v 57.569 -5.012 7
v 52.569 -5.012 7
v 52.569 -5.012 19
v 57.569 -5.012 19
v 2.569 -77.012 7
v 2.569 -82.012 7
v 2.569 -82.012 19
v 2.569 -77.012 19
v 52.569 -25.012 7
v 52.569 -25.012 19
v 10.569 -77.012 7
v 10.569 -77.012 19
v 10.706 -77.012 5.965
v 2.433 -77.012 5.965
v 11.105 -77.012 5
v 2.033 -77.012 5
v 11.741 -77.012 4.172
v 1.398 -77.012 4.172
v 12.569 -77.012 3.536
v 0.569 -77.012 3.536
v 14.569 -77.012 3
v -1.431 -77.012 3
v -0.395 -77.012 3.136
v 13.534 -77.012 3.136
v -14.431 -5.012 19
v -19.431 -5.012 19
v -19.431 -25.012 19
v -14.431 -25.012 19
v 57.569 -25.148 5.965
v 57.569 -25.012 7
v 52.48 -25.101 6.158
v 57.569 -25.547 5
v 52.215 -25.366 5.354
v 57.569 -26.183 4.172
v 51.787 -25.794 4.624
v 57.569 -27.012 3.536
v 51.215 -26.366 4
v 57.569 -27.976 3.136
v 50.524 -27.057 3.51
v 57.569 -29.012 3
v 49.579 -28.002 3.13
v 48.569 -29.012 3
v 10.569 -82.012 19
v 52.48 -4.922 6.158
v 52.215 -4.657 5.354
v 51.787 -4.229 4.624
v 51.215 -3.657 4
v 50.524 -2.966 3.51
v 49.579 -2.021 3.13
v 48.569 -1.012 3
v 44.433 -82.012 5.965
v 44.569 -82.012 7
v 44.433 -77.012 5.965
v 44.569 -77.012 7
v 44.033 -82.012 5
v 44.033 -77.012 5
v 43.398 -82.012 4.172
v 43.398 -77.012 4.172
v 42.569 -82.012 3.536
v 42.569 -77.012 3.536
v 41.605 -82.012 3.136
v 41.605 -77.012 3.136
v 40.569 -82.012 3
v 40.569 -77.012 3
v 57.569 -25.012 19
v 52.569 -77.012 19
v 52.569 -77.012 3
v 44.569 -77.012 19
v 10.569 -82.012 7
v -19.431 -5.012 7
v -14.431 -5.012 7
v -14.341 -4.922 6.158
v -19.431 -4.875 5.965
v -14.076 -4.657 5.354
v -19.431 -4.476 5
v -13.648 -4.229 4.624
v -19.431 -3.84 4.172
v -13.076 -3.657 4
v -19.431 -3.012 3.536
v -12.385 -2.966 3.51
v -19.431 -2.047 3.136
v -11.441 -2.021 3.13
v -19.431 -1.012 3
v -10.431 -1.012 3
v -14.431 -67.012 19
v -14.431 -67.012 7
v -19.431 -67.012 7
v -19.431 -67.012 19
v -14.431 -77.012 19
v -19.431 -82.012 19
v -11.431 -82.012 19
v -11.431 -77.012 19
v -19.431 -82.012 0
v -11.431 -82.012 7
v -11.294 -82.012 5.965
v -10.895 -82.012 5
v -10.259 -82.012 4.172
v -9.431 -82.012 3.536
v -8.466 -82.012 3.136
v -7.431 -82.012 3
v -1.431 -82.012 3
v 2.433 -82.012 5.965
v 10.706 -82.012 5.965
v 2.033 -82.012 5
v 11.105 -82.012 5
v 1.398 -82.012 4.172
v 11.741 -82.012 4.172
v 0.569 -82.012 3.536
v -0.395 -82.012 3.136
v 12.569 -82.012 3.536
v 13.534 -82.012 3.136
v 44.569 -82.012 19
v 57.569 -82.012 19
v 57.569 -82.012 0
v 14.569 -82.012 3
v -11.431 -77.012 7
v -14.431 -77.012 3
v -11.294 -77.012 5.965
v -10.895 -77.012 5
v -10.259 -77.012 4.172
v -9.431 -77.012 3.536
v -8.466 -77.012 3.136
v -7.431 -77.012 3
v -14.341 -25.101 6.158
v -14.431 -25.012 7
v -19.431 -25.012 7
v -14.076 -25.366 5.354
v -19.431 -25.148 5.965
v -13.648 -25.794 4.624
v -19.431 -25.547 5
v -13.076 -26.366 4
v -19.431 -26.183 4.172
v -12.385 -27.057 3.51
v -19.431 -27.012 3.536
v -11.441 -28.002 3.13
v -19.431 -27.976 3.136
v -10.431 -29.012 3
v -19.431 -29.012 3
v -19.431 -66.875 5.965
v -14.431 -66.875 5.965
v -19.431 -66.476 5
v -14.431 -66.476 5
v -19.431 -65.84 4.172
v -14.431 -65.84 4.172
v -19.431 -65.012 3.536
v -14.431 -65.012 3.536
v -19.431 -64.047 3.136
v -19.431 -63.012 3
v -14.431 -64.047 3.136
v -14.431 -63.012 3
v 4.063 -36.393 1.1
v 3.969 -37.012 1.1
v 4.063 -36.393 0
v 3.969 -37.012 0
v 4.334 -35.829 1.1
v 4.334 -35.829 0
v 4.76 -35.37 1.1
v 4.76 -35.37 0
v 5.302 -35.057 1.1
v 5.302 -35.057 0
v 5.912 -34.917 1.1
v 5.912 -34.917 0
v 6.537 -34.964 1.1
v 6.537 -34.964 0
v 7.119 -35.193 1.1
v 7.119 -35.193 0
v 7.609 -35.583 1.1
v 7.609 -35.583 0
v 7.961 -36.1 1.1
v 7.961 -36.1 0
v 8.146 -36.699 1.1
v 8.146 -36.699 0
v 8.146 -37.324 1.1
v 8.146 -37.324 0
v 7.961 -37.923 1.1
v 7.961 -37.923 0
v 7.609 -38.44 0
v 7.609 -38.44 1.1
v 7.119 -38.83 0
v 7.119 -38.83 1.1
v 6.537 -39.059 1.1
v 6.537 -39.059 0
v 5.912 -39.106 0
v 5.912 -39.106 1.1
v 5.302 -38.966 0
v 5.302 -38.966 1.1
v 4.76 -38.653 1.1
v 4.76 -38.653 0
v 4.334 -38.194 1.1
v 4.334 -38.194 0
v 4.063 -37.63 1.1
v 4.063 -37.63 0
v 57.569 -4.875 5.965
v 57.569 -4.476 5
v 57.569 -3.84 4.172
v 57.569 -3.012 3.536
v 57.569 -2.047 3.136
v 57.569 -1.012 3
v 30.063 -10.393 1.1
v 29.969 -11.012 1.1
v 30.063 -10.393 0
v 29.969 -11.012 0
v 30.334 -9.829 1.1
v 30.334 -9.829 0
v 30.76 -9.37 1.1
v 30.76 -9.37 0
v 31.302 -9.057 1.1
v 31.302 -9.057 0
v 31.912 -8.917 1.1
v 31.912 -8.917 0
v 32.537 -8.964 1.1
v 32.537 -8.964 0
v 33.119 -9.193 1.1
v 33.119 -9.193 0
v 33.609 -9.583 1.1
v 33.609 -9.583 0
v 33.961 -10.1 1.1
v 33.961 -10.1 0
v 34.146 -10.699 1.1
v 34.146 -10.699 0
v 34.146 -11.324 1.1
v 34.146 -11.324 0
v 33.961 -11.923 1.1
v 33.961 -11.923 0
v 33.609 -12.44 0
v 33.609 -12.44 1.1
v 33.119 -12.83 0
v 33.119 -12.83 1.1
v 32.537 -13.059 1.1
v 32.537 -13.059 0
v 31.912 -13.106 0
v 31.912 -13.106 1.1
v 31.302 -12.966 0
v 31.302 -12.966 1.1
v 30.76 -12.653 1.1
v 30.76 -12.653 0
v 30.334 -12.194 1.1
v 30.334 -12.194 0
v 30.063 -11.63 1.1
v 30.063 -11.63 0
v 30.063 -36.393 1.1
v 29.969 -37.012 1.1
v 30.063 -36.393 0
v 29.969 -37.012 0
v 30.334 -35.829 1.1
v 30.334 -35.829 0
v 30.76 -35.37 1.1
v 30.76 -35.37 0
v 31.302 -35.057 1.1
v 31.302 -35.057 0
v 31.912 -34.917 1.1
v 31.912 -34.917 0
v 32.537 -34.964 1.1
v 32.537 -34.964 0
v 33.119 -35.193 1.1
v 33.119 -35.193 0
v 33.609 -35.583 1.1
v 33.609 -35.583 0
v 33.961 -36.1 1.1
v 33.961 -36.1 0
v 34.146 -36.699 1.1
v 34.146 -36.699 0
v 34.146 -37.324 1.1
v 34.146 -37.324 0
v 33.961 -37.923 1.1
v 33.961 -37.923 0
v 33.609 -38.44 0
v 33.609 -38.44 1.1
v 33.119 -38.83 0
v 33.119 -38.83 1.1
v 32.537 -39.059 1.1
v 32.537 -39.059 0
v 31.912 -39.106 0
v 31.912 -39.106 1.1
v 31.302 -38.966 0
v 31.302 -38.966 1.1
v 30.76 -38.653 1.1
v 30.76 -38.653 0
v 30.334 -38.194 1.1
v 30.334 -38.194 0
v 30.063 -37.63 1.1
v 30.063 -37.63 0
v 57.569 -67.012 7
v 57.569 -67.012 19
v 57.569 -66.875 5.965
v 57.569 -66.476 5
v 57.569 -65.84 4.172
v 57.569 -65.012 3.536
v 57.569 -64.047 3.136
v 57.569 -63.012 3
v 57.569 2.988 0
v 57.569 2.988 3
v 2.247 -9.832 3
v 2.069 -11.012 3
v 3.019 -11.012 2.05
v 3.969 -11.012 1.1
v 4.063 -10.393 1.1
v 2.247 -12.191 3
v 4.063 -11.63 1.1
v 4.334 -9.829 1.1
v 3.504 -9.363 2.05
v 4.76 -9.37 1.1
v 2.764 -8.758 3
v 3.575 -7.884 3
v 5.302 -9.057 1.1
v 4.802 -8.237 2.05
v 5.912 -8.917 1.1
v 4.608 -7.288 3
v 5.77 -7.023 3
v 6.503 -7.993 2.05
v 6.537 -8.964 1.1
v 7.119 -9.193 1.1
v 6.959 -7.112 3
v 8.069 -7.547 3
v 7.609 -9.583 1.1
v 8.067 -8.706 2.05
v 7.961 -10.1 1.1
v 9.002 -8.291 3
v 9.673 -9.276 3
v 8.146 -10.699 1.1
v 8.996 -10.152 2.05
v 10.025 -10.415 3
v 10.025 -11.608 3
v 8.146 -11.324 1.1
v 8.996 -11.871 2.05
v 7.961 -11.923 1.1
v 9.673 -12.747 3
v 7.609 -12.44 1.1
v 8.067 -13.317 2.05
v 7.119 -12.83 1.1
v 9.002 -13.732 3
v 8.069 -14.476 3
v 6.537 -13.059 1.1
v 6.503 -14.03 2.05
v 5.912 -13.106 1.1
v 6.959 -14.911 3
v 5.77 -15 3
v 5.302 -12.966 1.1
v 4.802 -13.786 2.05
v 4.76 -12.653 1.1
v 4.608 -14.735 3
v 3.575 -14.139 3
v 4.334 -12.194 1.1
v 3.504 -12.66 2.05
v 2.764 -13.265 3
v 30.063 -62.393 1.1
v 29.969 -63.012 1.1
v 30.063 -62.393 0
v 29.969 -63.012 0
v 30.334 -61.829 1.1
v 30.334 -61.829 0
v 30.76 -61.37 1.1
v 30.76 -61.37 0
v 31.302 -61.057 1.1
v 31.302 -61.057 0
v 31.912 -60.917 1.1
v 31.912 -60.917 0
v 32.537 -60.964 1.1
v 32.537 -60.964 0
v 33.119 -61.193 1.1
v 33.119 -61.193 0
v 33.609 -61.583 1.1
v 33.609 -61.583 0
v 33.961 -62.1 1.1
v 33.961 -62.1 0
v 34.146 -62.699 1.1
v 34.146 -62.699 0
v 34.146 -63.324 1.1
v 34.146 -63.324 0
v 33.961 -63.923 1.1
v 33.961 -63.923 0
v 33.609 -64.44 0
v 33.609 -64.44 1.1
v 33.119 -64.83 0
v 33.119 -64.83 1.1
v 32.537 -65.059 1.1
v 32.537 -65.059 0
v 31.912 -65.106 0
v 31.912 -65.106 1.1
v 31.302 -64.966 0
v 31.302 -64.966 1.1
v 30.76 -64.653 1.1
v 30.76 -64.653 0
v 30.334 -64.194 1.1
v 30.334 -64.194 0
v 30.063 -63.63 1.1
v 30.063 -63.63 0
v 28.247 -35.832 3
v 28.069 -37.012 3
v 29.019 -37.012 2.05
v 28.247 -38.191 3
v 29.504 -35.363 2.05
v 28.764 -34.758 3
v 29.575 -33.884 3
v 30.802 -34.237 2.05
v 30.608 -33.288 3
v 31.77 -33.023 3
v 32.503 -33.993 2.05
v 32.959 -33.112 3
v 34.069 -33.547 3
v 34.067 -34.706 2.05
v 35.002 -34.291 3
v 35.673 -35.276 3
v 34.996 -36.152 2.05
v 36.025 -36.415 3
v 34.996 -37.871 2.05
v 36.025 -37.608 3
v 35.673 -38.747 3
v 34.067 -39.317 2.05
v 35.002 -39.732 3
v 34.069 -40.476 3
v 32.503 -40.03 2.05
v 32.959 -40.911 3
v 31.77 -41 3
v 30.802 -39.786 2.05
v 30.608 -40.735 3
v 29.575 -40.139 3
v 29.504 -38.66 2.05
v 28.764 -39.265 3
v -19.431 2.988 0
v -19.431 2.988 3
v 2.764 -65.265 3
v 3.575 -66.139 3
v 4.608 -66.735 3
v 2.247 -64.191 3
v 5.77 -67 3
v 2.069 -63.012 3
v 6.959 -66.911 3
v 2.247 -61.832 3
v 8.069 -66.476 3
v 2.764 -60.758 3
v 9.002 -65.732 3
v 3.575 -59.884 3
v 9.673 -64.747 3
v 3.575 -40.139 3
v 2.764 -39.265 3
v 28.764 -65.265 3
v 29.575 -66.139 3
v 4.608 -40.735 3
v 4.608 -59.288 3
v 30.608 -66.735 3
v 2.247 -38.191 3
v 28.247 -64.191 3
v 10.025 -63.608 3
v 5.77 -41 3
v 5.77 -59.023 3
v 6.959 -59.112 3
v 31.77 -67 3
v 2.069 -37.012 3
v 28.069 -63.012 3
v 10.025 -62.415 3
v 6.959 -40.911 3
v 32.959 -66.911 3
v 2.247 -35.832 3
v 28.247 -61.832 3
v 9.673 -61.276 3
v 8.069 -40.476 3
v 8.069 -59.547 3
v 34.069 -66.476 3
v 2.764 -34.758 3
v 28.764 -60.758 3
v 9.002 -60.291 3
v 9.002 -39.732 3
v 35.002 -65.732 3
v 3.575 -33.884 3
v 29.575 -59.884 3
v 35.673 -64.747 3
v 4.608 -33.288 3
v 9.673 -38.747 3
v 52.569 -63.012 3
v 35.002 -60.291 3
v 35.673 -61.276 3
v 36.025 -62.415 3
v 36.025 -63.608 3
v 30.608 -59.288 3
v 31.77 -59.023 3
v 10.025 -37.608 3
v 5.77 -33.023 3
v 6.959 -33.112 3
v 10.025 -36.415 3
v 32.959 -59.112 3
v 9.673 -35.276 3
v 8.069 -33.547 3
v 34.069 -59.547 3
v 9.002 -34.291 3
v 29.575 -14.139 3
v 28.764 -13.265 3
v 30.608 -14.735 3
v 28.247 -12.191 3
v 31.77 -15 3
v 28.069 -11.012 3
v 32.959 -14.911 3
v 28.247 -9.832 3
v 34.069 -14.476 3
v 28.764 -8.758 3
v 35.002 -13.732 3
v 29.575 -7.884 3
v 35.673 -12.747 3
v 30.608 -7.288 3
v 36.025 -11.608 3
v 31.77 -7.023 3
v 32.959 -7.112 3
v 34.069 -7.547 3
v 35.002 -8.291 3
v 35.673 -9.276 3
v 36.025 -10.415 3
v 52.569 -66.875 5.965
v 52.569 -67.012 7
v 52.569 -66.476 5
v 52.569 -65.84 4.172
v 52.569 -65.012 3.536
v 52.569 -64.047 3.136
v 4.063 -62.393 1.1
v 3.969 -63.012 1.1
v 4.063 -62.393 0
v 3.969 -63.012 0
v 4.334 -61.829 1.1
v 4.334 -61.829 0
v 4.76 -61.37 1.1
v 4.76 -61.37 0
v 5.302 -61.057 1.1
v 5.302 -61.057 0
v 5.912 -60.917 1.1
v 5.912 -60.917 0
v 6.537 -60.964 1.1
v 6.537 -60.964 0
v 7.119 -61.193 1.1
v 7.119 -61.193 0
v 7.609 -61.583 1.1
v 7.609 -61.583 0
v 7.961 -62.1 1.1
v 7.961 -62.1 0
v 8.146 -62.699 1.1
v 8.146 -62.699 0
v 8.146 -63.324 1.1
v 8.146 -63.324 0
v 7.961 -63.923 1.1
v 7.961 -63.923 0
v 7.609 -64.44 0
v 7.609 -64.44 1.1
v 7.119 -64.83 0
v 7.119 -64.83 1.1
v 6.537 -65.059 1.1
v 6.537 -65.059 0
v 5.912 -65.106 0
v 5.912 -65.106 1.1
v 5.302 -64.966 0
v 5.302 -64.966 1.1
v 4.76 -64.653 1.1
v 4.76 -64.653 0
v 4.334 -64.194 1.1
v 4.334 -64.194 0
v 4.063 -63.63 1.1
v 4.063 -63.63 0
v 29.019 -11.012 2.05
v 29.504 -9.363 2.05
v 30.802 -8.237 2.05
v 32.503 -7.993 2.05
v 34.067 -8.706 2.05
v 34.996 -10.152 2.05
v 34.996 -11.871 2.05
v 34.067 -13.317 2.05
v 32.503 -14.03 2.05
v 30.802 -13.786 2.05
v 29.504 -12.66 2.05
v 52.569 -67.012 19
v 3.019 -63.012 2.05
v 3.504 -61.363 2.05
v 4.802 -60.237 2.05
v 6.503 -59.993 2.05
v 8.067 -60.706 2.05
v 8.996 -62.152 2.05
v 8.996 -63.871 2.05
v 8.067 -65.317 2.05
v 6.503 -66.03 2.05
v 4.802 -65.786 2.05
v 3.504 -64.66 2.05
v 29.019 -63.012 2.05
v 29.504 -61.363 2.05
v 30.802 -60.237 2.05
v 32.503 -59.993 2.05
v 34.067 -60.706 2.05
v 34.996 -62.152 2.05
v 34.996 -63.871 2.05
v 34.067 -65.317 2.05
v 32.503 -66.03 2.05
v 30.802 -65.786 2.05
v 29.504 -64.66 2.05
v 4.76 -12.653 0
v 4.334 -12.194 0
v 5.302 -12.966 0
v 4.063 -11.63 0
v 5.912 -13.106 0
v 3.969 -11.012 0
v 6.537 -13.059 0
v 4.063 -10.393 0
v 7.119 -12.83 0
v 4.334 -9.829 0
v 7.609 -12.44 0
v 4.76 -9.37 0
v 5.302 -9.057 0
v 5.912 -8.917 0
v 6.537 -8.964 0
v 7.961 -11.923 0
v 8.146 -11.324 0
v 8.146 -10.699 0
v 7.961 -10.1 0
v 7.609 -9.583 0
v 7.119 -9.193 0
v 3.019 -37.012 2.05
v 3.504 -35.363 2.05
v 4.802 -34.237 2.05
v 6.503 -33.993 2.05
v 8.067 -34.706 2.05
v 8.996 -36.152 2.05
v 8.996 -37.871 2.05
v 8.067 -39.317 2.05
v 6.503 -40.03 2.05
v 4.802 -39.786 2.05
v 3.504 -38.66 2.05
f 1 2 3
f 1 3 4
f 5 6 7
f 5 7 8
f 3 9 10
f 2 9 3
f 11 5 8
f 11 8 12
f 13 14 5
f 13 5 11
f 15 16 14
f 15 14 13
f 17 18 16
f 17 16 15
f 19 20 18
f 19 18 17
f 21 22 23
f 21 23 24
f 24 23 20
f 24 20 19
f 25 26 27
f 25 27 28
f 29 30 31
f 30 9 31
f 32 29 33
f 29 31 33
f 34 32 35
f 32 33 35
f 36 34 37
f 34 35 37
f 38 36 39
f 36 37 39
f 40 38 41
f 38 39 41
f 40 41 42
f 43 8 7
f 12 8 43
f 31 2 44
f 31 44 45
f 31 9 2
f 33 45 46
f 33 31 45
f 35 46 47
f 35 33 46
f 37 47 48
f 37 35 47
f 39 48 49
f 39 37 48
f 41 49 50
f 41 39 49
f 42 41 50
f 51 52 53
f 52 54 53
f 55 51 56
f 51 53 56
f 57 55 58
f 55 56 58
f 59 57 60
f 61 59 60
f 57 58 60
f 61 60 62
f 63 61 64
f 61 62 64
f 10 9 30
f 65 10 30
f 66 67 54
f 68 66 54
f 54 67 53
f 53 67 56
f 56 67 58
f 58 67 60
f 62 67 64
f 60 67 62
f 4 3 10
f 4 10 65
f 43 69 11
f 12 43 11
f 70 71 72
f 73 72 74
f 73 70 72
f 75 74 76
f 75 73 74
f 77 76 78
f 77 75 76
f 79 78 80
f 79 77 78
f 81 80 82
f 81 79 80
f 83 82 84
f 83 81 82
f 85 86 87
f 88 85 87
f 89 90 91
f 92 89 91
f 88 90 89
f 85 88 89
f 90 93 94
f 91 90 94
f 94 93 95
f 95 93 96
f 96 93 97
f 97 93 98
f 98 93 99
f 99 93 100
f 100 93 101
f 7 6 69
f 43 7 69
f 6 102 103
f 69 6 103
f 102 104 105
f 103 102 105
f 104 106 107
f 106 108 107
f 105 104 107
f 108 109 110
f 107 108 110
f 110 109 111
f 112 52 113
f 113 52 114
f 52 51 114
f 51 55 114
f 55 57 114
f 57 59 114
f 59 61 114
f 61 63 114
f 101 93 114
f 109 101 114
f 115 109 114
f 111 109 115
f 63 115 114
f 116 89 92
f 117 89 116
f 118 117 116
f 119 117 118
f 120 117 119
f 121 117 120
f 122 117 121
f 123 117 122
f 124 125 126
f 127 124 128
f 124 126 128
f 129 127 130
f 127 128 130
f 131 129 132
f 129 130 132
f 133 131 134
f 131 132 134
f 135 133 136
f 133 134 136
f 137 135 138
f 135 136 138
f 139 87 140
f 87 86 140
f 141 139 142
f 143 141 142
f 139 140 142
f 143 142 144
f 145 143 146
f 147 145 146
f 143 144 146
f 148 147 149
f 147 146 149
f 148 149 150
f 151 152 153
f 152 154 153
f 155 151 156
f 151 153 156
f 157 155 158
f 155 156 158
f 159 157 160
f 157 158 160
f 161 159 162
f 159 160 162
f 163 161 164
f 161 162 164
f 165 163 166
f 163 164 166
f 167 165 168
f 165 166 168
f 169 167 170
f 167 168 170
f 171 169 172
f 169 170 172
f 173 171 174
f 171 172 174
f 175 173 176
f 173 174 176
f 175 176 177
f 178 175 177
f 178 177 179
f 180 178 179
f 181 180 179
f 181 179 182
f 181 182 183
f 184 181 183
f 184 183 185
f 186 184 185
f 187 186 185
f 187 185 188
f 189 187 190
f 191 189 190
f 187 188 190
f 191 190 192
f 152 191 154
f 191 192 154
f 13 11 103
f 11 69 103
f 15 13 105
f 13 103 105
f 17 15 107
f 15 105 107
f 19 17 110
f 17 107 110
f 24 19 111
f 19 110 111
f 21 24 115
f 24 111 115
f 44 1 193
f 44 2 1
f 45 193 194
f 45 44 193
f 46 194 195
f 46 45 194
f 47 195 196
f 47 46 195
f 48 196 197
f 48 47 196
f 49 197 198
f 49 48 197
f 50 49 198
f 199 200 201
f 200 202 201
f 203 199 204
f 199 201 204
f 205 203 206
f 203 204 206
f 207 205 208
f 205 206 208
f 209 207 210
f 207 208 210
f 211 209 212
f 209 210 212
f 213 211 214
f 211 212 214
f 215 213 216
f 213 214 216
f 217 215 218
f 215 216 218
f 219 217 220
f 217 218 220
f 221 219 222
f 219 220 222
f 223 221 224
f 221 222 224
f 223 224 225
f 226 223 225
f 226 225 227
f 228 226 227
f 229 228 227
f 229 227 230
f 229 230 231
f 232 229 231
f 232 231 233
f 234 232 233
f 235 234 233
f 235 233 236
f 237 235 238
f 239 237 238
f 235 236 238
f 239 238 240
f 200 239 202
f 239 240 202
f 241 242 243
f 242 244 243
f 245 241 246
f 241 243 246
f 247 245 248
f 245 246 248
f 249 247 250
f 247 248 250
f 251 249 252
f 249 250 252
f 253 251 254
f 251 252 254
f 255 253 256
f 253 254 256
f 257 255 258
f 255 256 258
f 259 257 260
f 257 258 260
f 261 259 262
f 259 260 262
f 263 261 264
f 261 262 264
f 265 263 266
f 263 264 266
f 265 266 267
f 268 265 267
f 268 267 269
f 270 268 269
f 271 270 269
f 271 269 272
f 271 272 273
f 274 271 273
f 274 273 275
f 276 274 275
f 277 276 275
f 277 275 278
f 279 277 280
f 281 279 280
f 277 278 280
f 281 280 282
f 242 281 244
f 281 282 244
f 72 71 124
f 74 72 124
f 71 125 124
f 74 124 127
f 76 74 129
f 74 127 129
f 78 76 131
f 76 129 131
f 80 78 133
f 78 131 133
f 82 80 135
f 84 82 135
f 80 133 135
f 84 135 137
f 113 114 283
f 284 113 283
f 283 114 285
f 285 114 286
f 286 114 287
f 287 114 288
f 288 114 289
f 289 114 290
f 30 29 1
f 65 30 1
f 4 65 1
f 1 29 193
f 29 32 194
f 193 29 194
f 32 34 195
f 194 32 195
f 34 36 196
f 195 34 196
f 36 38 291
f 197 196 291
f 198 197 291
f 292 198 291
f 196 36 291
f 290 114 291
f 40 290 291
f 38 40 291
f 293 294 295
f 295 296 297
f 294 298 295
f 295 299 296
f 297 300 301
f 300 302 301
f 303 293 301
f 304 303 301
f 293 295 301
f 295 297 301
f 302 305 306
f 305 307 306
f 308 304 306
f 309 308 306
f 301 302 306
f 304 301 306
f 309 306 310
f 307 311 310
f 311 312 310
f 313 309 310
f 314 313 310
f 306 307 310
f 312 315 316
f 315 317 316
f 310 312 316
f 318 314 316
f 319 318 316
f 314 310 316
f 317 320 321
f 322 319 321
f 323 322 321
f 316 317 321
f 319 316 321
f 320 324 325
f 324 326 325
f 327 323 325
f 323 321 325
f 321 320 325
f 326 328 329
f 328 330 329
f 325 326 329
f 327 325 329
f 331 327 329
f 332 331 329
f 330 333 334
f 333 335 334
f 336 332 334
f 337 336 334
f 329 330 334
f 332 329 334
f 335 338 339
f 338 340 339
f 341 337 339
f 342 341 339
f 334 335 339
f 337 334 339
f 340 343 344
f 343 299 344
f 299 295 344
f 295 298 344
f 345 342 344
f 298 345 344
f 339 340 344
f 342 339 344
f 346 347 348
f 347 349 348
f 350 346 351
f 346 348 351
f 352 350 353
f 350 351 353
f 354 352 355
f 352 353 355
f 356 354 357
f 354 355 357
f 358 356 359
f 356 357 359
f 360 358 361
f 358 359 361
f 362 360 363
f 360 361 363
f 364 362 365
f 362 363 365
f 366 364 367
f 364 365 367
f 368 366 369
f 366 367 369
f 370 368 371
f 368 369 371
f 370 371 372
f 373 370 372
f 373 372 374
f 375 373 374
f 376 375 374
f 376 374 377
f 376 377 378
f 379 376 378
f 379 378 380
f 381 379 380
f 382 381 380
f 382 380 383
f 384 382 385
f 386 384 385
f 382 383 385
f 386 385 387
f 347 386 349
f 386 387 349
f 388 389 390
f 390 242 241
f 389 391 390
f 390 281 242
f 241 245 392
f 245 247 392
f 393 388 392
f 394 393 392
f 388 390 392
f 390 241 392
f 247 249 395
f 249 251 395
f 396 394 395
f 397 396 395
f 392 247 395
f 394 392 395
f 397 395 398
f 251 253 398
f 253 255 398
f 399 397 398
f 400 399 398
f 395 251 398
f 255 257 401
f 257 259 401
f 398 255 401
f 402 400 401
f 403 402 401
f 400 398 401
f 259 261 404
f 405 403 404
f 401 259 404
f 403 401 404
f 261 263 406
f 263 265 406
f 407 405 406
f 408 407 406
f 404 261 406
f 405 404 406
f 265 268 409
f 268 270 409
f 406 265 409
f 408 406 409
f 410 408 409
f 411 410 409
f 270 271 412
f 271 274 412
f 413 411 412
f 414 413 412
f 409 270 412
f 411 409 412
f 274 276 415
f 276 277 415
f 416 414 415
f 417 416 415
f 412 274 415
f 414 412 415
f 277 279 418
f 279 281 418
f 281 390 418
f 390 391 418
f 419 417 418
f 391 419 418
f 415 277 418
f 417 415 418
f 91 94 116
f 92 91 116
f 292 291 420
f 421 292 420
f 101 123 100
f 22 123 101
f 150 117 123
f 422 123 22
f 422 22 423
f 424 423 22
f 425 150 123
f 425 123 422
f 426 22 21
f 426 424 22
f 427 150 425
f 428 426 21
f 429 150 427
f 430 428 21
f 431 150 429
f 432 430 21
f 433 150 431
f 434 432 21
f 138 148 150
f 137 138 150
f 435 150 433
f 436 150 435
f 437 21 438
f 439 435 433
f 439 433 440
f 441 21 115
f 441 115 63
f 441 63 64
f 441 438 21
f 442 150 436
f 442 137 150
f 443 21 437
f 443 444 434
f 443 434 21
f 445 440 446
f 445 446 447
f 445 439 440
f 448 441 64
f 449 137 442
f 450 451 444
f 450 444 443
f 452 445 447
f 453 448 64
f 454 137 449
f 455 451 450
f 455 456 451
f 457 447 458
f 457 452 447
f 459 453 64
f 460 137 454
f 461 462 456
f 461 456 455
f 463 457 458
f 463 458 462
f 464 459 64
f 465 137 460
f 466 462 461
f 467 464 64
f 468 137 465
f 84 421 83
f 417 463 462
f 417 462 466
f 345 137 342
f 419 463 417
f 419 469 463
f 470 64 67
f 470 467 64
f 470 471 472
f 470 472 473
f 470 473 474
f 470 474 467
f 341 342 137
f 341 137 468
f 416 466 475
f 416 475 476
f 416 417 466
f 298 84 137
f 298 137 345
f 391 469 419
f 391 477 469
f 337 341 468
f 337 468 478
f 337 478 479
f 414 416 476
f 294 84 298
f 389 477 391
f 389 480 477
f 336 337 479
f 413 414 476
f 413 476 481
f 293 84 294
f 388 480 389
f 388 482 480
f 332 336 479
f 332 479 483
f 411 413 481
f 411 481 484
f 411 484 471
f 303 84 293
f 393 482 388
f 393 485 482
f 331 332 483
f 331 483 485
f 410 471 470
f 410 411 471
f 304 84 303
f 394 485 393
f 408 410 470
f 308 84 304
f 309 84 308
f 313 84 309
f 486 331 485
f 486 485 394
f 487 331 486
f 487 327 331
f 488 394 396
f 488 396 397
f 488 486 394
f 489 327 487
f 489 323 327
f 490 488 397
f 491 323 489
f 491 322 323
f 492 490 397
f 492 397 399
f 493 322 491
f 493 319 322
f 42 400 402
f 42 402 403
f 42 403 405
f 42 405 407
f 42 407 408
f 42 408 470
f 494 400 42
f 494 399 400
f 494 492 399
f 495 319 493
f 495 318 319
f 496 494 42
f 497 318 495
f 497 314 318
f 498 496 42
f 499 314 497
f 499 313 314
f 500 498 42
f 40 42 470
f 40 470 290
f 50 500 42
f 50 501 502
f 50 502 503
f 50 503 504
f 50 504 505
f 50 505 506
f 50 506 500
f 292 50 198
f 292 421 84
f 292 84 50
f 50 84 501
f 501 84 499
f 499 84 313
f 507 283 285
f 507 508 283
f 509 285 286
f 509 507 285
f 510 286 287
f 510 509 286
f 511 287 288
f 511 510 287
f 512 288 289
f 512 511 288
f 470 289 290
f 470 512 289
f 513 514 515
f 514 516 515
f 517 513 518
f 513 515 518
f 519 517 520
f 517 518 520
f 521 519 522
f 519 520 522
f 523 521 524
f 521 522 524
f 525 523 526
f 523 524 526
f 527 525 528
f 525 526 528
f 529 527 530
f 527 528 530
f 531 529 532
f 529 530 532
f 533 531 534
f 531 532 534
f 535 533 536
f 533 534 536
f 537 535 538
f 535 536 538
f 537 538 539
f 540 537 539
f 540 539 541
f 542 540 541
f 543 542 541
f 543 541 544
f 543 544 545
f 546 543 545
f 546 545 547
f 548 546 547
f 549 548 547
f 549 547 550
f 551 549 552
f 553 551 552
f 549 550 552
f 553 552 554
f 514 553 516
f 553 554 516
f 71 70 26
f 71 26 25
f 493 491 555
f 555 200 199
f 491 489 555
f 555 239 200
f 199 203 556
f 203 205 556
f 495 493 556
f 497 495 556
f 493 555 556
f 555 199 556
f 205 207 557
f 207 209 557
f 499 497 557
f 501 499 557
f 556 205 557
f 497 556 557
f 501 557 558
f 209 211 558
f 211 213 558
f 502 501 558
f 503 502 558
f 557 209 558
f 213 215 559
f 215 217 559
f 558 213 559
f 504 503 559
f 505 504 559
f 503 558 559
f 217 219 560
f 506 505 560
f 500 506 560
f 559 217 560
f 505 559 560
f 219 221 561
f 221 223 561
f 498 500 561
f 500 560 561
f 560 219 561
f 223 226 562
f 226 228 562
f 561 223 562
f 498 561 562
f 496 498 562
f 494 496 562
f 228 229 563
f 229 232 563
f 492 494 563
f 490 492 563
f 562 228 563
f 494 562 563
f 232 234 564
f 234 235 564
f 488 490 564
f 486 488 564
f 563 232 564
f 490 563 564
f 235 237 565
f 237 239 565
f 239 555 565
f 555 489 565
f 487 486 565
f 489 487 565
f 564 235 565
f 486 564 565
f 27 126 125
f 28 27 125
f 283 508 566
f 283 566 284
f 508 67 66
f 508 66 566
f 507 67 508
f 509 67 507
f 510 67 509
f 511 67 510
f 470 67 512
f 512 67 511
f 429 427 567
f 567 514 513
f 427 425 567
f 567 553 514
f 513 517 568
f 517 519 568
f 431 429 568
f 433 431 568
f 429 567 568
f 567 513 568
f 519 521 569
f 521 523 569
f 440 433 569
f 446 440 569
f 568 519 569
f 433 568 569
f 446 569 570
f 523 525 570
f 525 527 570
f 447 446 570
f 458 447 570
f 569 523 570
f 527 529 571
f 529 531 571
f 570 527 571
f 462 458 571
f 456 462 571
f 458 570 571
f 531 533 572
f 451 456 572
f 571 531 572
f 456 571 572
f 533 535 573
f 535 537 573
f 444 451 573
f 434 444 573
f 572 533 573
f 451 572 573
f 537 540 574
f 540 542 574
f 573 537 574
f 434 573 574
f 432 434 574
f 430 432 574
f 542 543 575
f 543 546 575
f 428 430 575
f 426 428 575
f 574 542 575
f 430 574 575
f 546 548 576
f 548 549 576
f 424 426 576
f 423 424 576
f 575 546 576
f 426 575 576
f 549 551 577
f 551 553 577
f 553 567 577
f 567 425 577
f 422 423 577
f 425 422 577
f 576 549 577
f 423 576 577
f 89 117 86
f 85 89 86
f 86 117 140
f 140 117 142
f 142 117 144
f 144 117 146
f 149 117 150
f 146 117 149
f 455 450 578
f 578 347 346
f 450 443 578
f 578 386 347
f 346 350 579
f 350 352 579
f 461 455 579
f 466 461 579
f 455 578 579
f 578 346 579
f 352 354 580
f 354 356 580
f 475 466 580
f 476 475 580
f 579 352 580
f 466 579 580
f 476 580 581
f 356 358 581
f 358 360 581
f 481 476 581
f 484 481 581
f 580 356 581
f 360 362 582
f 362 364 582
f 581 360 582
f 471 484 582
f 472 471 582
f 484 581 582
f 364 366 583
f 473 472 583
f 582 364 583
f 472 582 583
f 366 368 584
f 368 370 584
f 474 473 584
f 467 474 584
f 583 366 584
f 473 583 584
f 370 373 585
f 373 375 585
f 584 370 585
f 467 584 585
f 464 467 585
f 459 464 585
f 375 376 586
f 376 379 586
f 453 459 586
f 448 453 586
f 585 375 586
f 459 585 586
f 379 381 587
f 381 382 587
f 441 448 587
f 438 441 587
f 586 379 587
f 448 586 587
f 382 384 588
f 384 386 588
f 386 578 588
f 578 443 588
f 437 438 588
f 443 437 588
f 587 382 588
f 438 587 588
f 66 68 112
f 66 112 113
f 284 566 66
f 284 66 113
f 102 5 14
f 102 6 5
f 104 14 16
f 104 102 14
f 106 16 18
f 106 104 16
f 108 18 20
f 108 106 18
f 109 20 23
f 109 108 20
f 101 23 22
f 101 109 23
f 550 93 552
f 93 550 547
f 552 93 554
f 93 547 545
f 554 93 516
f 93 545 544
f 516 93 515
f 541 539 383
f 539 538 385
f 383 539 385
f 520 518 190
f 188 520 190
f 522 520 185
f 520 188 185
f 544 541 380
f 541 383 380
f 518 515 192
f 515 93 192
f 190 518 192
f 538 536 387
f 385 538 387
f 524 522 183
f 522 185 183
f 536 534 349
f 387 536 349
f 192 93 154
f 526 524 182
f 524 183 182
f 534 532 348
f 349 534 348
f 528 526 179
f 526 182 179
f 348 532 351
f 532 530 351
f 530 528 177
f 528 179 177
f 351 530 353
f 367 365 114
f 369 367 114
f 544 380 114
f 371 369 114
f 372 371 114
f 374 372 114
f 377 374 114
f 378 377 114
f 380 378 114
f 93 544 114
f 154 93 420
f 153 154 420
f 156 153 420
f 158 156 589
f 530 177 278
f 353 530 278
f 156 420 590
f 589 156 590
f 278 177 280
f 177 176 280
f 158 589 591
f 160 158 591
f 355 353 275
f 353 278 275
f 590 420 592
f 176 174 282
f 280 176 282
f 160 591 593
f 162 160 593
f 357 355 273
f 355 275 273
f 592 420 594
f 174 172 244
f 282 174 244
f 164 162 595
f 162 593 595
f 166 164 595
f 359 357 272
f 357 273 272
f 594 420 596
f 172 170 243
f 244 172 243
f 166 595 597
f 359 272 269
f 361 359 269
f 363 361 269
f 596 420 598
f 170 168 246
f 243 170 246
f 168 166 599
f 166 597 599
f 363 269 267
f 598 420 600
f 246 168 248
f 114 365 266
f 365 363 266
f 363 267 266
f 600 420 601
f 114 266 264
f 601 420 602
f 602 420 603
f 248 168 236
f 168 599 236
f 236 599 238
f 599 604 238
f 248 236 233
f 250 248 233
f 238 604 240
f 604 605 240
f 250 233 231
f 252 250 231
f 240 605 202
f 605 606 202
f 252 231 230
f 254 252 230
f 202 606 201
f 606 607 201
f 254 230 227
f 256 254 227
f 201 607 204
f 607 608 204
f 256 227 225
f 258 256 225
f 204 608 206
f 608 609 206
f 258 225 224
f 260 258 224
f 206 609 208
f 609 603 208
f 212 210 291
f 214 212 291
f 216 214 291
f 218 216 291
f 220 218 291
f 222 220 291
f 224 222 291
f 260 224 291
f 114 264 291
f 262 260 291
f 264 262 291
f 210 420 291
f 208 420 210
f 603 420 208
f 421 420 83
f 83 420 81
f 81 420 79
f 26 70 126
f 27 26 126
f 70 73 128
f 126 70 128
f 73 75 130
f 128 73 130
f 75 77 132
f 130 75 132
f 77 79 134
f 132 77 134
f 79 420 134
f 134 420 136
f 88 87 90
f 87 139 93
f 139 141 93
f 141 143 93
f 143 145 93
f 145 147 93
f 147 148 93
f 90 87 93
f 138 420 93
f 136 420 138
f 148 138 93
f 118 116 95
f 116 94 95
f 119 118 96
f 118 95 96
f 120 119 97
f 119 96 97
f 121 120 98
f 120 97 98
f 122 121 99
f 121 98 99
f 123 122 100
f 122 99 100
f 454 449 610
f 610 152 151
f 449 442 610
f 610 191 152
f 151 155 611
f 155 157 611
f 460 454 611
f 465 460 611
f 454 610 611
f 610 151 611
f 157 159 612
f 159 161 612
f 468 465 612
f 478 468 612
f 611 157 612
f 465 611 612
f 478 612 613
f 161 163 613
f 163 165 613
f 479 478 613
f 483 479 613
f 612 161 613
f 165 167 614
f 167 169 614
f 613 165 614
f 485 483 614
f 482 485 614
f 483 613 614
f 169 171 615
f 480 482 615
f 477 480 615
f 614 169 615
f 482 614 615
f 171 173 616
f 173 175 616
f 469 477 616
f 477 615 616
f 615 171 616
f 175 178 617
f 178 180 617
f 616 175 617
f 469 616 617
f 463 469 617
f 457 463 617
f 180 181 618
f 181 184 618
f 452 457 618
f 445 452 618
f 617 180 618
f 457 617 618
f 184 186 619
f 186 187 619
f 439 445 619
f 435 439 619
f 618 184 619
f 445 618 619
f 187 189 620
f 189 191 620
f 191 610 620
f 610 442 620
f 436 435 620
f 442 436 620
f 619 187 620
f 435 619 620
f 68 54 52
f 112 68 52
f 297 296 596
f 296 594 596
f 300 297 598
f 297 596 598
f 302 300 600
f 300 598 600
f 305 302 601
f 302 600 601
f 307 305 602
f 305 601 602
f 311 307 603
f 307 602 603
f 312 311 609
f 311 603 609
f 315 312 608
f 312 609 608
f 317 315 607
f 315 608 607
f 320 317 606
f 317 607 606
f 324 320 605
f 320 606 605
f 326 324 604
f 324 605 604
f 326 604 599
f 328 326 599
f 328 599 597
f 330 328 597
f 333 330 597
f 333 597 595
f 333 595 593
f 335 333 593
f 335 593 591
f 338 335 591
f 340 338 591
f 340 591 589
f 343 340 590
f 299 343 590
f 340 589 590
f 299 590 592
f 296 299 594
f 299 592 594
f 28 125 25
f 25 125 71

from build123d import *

# Parameters (mm, degrees)
F0_W           = 8
F0_H           = 5
F0_W_2         = 3
F0_W_3         = 5
F0_H_2         = 10
F0_H_3         = 20
F1_DEPTH       = 3
F2_DEPTH       = 19
F4_D           = 4.2
F4_CSINK_D     = 8
F4_CSINK_ANGLE = 90
F5_R           = 4


with BuildPart() as f1:
    # F0 (on Top) → F1 (new body)
    with BuildSketch(Plane.XY):
        Polygon((57.569327, 2.988489), (-19.430673, 2.988489), (-19.430673, -5.011511), (-14.430673, -5.011511), (-14.430673, -25.011511), (-19.430673, -25.011511), (-19.430673, -67.011511), (-14.430673, -67.011511), (-14.430673, -77.011511), (-11.430673, -77.011511), (-11.430673, -82.011511), (2.569327, -82.011511), (2.569327, -77.011511), (10.569327, -77.011511), (10.569327, -82.011511), (44.569327, -82.011511), (44.569327, -77.011511), (52.569327, -77.011511), (52.569327, -67.011511), (57.569327, -67.011511), (57.569327, -25.011511), (52.569327, -25.011511), (52.569327, -5.011511), (57.569327, -5.011511), align=None)
        with Locations((6.569327, -79.511511)):
            Rectangle(F0_W, F0_H)
        Polygon((-14.430673, -67.011511), (-19.430673, -67.011511), (-19.430673, -82.011511), (-14.430673, -82.011511), (-14.430673, -77.011511), align=None)
        with Locations((-12.930673, -79.511511)):
            Rectangle(F0_W_2, F0_H)
        Polygon((57.569327, -82.011511), (57.569327, -77.011511), (52.569327, -77.011511), (44.569327, -77.011511), (44.569327, -82.011511), align=None)
        with Locations((55.069327, -72.011511)):
            Rectangle(F0_W_3, F0_H_2)
        with Locations((55.069327, -15.011511)):
            Rectangle(F0_W_3, F0_H_3)
        with Locations((-16.930673, -15.011511)):
            Rectangle(F0_W_3, F0_H_3)
    extrude(amount=F1_DEPTH)

    # F0 (on Top) → F2 (join)
    with BuildSketch(Plane.XY):
        with Locations((-16.930673, -15.011511)):
            Rectangle(F0_W_3, F0_H_3)
        with Locations((55.069327, -15.011511)):
            Rectangle(F0_W_3, F0_H_3)
        with Locations((55.069327, -72.011511)):
            Rectangle(F0_W_3, F0_H_2)
        Polygon((57.569327, -82.011511), (57.569327, -77.011511), (52.569327, -77.011511), (44.569327, -77.011511), (44.569327, -82.011511), align=None)
        with Locations((6.569327, -79.511511)):
            Rectangle(F0_W, F0_H)
        Polygon((-14.430673, -67.011511), (-19.430673, -67.011511), (-19.430673, -82.011511), (-14.430673, -82.011511), (-14.430673, -77.011511), align=None)
        with Locations((-12.930673, -79.511511)):
            Rectangle(F0_W_2, F0_H)
    extrude(amount=F2_DEPTH)

    # F4 (through all)
    with Locations(Plane.XY.offset(3)):
        with Locations((6.069327, -11.011511), (32.069327, -11.011511), (6.069327, -63.011511), (32.069327, -63.011511), (32.069327, -37.011511), (6.069327, -37.011511)):
            CounterSinkHole(F4_D / 2, F4_CSINK_D / 2, counter_sink_angle=F4_CSINK_ANGLE)

    # F5
    f5_edges = [f1.edges().sort_by_distance(p)[0] for p in [
        (-16.930673, -25.011511, 3),
        (-16.930673, -67.011511, 3),
        (-11.430673, -79.511511, 3),
        (10.569327, -79.511511, 3),
        (2.569327, -79.511511, 3),
        (44.569327, -79.511511, 3),
        (55.069327, -25.011511, 3),
        (55.069327, -67.011511, 3),
        (55.069327, -5.011511, 3),
        (-16.930673, -5.011511, 3),
        (-14.430673, -15.011511, 3),
        (52.569327, -15.011511, 3),
    ]]
    fillet(f5_edges, radius=F5_R)


solid = f1.part
